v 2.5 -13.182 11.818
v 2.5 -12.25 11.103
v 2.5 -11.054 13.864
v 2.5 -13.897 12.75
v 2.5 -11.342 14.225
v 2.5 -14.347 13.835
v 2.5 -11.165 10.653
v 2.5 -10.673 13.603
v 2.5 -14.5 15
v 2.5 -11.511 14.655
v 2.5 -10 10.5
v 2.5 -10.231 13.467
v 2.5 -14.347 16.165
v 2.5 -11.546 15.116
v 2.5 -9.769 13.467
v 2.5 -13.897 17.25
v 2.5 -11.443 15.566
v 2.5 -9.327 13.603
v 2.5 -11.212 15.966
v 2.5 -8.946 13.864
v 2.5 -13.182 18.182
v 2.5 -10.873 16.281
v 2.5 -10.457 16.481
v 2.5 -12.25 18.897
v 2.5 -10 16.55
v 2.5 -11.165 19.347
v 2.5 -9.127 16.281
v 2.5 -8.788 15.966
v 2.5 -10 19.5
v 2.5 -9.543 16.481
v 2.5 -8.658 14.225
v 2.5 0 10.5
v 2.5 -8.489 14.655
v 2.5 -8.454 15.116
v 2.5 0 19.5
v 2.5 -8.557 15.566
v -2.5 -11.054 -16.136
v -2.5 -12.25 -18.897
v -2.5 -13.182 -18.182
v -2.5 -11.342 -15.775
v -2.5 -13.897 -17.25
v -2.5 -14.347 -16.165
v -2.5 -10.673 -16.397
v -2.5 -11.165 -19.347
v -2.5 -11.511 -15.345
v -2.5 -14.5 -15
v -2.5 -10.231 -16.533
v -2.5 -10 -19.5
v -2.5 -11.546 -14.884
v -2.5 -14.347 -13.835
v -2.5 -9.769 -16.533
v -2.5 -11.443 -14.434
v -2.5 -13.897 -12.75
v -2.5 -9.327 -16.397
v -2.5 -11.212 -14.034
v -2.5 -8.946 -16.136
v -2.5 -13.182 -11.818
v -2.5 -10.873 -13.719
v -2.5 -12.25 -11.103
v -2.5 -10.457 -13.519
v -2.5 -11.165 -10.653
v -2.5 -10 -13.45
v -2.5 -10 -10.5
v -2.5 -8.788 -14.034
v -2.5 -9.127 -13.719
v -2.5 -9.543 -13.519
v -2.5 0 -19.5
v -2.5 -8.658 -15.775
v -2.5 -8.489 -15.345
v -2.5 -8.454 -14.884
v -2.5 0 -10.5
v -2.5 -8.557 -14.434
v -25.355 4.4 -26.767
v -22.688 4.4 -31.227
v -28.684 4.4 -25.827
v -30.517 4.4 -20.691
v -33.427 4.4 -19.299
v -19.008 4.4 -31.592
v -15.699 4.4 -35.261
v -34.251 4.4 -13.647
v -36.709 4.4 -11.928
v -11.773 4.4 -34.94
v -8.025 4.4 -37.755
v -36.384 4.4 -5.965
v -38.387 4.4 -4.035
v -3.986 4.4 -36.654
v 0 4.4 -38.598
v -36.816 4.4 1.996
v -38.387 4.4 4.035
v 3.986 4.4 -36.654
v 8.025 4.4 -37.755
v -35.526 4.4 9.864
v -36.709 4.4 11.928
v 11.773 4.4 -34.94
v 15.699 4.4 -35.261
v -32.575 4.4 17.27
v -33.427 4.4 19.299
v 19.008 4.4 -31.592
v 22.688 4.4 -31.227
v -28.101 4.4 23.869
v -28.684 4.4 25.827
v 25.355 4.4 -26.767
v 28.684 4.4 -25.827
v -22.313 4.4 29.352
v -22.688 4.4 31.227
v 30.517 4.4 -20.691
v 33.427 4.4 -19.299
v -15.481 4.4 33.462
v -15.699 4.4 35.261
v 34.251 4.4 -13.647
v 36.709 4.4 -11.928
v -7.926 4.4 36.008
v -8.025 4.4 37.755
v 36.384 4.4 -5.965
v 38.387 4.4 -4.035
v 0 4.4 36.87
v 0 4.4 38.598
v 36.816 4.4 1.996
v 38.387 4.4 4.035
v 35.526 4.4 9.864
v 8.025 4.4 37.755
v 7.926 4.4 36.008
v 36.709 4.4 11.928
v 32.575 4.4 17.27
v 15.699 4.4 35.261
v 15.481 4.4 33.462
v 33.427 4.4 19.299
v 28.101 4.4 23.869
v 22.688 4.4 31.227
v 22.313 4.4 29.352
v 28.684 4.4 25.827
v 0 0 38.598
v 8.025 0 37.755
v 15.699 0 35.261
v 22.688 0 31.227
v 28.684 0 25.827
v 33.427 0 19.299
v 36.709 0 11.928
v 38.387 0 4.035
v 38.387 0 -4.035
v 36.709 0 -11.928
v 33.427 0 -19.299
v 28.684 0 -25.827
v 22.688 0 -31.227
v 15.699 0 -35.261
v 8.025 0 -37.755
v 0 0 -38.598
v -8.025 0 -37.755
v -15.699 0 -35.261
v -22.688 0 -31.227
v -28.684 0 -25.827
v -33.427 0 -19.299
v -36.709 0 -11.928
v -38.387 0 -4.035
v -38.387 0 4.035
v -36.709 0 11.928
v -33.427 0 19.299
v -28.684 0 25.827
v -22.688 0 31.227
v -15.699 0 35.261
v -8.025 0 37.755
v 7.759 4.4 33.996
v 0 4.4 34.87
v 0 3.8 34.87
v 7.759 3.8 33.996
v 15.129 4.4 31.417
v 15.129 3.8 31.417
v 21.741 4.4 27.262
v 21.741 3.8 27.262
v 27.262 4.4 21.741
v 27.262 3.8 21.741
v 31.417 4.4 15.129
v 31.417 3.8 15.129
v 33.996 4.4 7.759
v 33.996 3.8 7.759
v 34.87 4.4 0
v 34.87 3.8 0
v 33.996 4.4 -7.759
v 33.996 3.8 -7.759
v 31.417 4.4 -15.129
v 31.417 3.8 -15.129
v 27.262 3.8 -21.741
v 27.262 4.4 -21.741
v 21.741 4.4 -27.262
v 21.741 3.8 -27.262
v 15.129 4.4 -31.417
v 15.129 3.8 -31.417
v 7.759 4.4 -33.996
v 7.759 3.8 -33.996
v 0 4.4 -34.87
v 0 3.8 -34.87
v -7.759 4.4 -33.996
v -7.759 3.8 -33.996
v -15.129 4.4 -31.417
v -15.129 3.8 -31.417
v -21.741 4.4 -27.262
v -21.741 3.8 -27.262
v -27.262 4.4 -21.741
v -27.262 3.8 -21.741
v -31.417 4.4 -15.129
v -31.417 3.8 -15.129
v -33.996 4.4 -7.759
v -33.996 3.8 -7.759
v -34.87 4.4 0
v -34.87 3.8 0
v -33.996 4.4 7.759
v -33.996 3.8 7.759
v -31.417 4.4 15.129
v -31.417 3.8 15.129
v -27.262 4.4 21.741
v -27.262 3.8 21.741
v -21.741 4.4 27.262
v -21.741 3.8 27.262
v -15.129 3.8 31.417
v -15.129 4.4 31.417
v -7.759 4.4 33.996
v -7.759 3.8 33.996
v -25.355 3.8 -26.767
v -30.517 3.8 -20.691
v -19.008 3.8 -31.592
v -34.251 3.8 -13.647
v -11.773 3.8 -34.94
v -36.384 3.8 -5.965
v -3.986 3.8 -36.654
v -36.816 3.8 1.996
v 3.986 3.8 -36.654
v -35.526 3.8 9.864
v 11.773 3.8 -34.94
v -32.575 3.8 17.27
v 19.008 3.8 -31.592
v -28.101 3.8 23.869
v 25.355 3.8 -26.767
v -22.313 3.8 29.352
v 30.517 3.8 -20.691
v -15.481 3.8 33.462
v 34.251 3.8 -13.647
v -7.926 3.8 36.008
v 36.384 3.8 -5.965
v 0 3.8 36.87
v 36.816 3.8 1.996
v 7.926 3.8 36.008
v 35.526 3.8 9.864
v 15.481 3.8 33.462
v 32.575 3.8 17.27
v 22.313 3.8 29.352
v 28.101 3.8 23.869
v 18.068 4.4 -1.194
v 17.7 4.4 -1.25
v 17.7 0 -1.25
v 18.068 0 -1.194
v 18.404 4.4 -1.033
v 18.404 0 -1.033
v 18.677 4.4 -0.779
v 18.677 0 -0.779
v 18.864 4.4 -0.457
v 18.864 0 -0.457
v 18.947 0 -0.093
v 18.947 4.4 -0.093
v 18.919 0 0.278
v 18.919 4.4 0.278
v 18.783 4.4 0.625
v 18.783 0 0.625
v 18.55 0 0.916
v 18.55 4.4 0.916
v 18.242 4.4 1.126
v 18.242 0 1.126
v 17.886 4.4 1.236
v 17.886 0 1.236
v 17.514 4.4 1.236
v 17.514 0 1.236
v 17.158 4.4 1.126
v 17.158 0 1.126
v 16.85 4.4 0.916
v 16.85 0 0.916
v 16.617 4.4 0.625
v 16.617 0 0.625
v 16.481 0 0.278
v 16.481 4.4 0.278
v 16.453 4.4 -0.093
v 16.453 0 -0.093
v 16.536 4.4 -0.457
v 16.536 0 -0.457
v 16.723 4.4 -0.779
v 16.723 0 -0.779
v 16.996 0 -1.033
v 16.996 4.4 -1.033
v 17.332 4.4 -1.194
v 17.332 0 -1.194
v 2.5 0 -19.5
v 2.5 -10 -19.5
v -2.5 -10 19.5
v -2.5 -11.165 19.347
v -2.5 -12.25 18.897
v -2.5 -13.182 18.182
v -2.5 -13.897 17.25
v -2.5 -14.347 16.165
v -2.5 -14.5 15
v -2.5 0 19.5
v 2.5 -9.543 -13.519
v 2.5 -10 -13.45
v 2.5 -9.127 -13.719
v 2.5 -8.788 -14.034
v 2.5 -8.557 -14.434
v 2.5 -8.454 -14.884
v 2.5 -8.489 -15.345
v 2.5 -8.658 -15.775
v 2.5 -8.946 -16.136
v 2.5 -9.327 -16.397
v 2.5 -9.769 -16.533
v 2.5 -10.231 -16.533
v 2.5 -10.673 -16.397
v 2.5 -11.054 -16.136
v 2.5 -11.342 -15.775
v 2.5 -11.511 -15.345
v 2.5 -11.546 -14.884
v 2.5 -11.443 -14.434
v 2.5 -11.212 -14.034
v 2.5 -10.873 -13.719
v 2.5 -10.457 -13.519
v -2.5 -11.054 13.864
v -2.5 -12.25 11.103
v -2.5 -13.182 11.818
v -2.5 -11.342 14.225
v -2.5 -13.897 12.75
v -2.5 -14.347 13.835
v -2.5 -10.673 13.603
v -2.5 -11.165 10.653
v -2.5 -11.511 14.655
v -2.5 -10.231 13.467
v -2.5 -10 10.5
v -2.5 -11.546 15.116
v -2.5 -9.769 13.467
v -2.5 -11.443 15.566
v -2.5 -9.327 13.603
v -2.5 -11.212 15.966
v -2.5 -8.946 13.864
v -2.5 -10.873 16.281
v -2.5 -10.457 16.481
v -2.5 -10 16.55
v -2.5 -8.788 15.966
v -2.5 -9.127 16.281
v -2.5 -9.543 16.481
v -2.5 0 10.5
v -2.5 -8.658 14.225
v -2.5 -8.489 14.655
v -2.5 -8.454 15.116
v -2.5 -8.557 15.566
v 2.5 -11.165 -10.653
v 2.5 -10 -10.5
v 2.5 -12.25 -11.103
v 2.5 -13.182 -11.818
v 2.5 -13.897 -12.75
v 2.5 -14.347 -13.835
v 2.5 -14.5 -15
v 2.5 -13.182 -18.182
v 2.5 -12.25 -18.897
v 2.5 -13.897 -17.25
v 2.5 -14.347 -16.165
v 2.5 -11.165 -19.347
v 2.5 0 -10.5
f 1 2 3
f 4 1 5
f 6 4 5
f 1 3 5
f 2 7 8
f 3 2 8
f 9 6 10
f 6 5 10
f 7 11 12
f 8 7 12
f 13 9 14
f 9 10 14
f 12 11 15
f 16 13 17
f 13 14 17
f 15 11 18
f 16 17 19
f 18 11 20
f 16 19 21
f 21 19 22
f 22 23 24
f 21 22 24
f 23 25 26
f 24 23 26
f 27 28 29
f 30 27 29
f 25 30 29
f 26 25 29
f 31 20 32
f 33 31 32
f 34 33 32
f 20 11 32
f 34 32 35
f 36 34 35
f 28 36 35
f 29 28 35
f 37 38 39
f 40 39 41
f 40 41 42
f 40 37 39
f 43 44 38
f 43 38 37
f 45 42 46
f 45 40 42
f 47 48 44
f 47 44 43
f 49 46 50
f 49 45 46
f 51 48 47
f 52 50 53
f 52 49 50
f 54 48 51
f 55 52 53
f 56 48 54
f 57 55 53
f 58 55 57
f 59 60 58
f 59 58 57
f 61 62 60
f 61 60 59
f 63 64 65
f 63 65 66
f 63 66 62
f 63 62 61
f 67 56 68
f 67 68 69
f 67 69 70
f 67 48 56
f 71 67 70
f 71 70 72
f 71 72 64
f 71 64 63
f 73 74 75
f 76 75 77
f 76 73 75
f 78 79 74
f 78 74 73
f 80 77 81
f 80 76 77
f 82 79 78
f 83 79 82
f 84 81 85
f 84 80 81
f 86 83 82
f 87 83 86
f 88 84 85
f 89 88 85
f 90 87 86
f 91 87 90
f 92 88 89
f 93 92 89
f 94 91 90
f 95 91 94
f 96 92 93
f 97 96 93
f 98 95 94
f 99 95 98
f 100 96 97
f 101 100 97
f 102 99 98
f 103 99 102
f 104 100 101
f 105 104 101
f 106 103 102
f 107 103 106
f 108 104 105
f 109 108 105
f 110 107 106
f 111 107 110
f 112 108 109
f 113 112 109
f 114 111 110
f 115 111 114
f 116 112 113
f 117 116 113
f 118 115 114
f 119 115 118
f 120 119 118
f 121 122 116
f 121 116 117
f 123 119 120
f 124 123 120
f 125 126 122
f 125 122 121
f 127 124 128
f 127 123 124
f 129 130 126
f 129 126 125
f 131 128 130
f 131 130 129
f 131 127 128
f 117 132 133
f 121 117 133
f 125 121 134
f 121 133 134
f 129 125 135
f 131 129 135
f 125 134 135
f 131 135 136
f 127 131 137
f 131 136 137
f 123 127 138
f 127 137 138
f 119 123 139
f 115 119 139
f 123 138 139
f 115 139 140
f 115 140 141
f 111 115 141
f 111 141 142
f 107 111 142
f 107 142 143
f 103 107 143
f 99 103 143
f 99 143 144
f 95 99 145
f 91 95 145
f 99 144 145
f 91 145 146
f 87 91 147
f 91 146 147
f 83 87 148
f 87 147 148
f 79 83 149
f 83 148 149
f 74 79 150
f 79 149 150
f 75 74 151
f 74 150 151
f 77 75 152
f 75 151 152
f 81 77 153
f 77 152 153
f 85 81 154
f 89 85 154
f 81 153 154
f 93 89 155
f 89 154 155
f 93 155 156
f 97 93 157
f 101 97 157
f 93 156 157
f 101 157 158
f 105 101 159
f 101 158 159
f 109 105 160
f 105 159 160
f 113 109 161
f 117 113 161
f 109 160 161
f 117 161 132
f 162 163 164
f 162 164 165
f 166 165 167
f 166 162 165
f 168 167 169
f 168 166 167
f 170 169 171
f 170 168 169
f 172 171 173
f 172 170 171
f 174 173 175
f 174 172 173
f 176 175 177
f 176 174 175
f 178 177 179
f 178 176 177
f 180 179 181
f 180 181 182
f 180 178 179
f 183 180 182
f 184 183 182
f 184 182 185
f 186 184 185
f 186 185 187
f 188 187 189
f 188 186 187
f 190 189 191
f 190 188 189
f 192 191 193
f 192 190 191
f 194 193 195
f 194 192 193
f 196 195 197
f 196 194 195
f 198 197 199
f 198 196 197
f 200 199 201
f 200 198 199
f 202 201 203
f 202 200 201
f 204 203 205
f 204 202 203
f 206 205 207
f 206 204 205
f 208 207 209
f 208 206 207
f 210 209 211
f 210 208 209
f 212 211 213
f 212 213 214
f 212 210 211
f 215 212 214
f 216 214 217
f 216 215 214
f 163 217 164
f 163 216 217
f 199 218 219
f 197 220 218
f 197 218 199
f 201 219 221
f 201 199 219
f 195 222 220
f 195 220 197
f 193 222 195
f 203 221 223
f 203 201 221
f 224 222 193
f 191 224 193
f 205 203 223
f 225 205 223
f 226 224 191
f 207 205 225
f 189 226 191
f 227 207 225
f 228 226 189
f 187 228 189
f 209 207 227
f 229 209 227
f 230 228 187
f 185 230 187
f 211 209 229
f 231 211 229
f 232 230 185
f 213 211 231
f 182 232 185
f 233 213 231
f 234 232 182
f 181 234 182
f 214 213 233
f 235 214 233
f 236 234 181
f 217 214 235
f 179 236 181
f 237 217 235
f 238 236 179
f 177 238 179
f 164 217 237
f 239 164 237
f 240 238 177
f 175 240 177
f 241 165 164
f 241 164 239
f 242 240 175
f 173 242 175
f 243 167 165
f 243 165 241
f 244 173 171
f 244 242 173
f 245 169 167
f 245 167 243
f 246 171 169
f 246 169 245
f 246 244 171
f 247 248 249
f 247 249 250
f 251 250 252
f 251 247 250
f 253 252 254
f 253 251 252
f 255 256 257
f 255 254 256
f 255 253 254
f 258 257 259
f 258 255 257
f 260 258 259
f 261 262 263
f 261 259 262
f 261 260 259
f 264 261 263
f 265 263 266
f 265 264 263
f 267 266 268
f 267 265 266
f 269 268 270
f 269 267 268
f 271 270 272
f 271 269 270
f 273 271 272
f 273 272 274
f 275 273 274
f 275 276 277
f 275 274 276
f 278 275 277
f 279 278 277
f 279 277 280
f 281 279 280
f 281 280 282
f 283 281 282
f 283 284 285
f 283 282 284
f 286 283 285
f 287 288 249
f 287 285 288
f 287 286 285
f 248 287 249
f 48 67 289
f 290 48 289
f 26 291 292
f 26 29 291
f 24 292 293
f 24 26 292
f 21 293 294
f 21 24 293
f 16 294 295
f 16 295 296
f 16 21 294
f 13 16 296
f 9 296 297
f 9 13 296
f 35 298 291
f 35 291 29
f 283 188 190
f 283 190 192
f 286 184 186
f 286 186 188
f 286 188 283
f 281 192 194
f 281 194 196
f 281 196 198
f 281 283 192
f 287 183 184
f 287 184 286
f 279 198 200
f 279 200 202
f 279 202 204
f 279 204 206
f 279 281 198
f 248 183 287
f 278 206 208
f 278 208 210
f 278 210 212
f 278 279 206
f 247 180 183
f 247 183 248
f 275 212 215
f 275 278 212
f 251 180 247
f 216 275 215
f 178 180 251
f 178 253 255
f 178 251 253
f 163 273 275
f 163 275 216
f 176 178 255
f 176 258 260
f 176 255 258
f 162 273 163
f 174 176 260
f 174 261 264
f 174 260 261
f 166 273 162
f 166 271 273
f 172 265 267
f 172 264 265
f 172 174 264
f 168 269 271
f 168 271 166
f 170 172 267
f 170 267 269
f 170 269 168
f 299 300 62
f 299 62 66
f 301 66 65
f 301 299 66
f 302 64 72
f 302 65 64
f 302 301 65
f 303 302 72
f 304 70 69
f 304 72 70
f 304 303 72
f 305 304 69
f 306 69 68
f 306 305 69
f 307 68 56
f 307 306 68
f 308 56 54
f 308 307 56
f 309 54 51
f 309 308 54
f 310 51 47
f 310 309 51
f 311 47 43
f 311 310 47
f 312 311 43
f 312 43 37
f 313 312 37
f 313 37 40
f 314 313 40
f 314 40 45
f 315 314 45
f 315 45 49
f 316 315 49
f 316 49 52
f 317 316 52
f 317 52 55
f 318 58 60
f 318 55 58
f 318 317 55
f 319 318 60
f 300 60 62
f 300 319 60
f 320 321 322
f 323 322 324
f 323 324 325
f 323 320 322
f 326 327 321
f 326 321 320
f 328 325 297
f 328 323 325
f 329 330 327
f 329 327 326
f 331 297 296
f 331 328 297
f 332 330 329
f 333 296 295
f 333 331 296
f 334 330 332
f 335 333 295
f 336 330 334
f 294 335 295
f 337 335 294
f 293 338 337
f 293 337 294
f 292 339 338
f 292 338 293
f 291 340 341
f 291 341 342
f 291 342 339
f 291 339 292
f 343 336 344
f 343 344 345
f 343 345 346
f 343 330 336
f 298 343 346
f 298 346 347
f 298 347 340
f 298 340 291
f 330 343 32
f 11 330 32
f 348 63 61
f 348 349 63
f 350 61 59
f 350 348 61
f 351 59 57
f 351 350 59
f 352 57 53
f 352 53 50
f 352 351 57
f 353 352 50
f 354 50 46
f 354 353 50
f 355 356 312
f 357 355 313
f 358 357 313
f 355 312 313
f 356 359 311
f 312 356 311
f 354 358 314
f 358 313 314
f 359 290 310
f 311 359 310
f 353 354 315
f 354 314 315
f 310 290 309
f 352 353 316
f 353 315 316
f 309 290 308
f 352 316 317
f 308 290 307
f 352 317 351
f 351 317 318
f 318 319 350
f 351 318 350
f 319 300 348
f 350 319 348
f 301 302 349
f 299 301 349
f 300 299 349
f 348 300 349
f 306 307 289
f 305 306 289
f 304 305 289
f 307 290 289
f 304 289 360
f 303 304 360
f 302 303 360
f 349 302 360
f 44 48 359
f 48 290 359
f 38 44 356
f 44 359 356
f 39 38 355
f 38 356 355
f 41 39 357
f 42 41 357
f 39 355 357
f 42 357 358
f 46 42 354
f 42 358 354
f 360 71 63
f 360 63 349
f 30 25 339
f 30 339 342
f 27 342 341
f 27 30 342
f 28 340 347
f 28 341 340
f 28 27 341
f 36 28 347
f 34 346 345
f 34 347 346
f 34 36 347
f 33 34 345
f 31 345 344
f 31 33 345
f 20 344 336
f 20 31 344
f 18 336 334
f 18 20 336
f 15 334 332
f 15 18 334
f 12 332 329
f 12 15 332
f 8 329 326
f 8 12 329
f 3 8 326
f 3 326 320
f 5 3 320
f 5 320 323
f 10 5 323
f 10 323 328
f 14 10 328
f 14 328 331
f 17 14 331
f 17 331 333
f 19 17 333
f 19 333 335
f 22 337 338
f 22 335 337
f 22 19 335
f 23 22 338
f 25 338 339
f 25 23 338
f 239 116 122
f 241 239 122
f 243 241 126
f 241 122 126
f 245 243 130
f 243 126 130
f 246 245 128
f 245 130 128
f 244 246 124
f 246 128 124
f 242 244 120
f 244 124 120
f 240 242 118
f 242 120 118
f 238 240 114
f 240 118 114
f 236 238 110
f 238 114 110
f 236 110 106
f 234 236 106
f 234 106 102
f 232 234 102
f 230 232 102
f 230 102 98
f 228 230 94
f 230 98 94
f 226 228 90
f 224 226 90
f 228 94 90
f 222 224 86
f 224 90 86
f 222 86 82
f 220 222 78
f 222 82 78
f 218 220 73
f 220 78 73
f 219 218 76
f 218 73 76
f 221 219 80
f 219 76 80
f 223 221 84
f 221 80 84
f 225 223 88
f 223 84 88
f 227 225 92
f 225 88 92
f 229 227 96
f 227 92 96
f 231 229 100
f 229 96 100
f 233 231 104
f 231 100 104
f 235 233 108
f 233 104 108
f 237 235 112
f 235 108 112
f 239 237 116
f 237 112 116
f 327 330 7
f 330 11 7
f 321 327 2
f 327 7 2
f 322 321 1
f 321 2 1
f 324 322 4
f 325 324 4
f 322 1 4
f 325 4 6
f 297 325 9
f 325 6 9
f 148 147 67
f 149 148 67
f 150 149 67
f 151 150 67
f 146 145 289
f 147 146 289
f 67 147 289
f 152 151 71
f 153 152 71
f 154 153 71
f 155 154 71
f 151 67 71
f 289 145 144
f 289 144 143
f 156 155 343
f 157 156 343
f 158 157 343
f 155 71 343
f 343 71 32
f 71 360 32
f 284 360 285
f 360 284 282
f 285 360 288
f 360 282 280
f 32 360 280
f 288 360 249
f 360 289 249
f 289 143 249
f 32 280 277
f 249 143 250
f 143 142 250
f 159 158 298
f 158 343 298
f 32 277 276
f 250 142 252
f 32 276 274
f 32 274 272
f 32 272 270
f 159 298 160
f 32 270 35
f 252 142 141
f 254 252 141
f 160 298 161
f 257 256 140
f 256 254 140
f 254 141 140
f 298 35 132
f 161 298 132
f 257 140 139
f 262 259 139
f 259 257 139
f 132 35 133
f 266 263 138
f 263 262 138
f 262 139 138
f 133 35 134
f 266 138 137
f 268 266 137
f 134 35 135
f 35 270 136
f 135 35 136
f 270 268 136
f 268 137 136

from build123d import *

# Parameters (mm, degrees)
SKETCH_1_R               = 38.598396019
EXTRUDE_1_DEPTH          = 4.4
SKETCH_2_R               = 36.869922329
SKETCH_2_R_2             = 34.869922329
CUT_EXTRUDE_1_DEPTH      = 0.6
SKETCH_3_W               = 5
SKETCH_3_H               = 9
EXTRUDE_2_DEPTH          = 14.5
FILLET_2_R               = 4.5
CUT_EXTRUDE_2_DEPTH      = 59.216529702
CUT_EXTRUDE_2_DEPTH_BACK = 59.216529702
SKETCH_4_R               = 1.55
CUT_EXTRUDE_3_DEPTH      = 57.479397575
CUT_EXTRUDE_3_DEPTH_BACK = 57.479397575
SKETCH_5_R               = 1.25


with BuildPart() as part:
    # 스케치1 → 보스-돌출1 (new body)
    with BuildSketch(Plane(origin=(0, 0, 0), x_dir=(1, 0, 0), z_dir=(0, 1, 0))):
        with Locations(Location((0, 0, 0), (0, 0, 270))):
            Circle(SKETCH_1_R)
    extrude(amount=EXTRUDE_1_DEPTH)

    # 스케치2 → 컷-돌출1 (cut)
    with BuildSketch(Plane(origin=(0, 4.4, 0), x_dir=(1, 0, 0), z_dir=(0, 1, 0))):
        with Locations(Location((0, 0, 0), (0, 0, 270))):
            Circle(SKETCH_2_R)
        with Locations(Location((0, 0, 0), (0, 0, 270))):
            Circle(SKETCH_2_R_2, mode=Mode.SUBTRACT)
    extrude(amount=-CUT_EXTRUDE_1_DEPTH, mode=Mode.SUBTRACT)

    # 스케치3 → 보스-돌출2 (add)
    with BuildSketch(Plane.XZ):
        with Locations((0, -15)):
            Rectangle(SKETCH_3_W, SKETCH_3_H)
        with Locations((0, 15)):
            Rectangle(SKETCH_3_W, SKETCH_3_H)
    extrude(amount=EXTRUDE_2_DEPTH)

    # 필렛2
    fillet_2_edges = [part.edges().sort_by_distance(p)[0] for p in [
        (0, -14.5, -19.5),
        (0, -14.5, -10.5),
        (0, -14.5, 19.5),
        (0, -14.5, 10.5),
    ]]
    fillet(fillet_2_edges, radius=FILLET_2_R - 0.0001)  # a hair under: the kernel refuses the full size

    # 스케치4 → 컷-돌출2 (cut, two sides: drawn at the far end of the back side and taken through both)
    with BuildSketch(Plane.ZY.offset(2.5).offset(-CUT_EXTRUDE_2_DEPTH_BACK)):
        with Locations((-15, -10)):
            Circle(SKETCH_4_R)
        with Locations((15, -10)):
            Circle(SKETCH_4_R)
    extrude(amount=CUT_EXTRUDE_2_DEPTH + CUT_EXTRUDE_2_DEPTH_BACK, mode=Mode.SUBTRACT)

    # 스케치5 → 컷-돌출3 (cut, two sides: drawn at the far end of the back side and taken through both)
    with BuildSketch(Plane.XZ.offset(-CUT_EXTRUDE_3_DEPTH_BACK)):
        with Locations(Location((17.7, 0, 0), (0, 0, 270))):
            Circle(SKETCH_5_R)
    extrude(amount=CUT_EXTRUDE_3_DEPTH + CUT_EXTRUDE_3_DEPTH_BACK, mode=Mode.SUBTRACT)


solid = part.part
